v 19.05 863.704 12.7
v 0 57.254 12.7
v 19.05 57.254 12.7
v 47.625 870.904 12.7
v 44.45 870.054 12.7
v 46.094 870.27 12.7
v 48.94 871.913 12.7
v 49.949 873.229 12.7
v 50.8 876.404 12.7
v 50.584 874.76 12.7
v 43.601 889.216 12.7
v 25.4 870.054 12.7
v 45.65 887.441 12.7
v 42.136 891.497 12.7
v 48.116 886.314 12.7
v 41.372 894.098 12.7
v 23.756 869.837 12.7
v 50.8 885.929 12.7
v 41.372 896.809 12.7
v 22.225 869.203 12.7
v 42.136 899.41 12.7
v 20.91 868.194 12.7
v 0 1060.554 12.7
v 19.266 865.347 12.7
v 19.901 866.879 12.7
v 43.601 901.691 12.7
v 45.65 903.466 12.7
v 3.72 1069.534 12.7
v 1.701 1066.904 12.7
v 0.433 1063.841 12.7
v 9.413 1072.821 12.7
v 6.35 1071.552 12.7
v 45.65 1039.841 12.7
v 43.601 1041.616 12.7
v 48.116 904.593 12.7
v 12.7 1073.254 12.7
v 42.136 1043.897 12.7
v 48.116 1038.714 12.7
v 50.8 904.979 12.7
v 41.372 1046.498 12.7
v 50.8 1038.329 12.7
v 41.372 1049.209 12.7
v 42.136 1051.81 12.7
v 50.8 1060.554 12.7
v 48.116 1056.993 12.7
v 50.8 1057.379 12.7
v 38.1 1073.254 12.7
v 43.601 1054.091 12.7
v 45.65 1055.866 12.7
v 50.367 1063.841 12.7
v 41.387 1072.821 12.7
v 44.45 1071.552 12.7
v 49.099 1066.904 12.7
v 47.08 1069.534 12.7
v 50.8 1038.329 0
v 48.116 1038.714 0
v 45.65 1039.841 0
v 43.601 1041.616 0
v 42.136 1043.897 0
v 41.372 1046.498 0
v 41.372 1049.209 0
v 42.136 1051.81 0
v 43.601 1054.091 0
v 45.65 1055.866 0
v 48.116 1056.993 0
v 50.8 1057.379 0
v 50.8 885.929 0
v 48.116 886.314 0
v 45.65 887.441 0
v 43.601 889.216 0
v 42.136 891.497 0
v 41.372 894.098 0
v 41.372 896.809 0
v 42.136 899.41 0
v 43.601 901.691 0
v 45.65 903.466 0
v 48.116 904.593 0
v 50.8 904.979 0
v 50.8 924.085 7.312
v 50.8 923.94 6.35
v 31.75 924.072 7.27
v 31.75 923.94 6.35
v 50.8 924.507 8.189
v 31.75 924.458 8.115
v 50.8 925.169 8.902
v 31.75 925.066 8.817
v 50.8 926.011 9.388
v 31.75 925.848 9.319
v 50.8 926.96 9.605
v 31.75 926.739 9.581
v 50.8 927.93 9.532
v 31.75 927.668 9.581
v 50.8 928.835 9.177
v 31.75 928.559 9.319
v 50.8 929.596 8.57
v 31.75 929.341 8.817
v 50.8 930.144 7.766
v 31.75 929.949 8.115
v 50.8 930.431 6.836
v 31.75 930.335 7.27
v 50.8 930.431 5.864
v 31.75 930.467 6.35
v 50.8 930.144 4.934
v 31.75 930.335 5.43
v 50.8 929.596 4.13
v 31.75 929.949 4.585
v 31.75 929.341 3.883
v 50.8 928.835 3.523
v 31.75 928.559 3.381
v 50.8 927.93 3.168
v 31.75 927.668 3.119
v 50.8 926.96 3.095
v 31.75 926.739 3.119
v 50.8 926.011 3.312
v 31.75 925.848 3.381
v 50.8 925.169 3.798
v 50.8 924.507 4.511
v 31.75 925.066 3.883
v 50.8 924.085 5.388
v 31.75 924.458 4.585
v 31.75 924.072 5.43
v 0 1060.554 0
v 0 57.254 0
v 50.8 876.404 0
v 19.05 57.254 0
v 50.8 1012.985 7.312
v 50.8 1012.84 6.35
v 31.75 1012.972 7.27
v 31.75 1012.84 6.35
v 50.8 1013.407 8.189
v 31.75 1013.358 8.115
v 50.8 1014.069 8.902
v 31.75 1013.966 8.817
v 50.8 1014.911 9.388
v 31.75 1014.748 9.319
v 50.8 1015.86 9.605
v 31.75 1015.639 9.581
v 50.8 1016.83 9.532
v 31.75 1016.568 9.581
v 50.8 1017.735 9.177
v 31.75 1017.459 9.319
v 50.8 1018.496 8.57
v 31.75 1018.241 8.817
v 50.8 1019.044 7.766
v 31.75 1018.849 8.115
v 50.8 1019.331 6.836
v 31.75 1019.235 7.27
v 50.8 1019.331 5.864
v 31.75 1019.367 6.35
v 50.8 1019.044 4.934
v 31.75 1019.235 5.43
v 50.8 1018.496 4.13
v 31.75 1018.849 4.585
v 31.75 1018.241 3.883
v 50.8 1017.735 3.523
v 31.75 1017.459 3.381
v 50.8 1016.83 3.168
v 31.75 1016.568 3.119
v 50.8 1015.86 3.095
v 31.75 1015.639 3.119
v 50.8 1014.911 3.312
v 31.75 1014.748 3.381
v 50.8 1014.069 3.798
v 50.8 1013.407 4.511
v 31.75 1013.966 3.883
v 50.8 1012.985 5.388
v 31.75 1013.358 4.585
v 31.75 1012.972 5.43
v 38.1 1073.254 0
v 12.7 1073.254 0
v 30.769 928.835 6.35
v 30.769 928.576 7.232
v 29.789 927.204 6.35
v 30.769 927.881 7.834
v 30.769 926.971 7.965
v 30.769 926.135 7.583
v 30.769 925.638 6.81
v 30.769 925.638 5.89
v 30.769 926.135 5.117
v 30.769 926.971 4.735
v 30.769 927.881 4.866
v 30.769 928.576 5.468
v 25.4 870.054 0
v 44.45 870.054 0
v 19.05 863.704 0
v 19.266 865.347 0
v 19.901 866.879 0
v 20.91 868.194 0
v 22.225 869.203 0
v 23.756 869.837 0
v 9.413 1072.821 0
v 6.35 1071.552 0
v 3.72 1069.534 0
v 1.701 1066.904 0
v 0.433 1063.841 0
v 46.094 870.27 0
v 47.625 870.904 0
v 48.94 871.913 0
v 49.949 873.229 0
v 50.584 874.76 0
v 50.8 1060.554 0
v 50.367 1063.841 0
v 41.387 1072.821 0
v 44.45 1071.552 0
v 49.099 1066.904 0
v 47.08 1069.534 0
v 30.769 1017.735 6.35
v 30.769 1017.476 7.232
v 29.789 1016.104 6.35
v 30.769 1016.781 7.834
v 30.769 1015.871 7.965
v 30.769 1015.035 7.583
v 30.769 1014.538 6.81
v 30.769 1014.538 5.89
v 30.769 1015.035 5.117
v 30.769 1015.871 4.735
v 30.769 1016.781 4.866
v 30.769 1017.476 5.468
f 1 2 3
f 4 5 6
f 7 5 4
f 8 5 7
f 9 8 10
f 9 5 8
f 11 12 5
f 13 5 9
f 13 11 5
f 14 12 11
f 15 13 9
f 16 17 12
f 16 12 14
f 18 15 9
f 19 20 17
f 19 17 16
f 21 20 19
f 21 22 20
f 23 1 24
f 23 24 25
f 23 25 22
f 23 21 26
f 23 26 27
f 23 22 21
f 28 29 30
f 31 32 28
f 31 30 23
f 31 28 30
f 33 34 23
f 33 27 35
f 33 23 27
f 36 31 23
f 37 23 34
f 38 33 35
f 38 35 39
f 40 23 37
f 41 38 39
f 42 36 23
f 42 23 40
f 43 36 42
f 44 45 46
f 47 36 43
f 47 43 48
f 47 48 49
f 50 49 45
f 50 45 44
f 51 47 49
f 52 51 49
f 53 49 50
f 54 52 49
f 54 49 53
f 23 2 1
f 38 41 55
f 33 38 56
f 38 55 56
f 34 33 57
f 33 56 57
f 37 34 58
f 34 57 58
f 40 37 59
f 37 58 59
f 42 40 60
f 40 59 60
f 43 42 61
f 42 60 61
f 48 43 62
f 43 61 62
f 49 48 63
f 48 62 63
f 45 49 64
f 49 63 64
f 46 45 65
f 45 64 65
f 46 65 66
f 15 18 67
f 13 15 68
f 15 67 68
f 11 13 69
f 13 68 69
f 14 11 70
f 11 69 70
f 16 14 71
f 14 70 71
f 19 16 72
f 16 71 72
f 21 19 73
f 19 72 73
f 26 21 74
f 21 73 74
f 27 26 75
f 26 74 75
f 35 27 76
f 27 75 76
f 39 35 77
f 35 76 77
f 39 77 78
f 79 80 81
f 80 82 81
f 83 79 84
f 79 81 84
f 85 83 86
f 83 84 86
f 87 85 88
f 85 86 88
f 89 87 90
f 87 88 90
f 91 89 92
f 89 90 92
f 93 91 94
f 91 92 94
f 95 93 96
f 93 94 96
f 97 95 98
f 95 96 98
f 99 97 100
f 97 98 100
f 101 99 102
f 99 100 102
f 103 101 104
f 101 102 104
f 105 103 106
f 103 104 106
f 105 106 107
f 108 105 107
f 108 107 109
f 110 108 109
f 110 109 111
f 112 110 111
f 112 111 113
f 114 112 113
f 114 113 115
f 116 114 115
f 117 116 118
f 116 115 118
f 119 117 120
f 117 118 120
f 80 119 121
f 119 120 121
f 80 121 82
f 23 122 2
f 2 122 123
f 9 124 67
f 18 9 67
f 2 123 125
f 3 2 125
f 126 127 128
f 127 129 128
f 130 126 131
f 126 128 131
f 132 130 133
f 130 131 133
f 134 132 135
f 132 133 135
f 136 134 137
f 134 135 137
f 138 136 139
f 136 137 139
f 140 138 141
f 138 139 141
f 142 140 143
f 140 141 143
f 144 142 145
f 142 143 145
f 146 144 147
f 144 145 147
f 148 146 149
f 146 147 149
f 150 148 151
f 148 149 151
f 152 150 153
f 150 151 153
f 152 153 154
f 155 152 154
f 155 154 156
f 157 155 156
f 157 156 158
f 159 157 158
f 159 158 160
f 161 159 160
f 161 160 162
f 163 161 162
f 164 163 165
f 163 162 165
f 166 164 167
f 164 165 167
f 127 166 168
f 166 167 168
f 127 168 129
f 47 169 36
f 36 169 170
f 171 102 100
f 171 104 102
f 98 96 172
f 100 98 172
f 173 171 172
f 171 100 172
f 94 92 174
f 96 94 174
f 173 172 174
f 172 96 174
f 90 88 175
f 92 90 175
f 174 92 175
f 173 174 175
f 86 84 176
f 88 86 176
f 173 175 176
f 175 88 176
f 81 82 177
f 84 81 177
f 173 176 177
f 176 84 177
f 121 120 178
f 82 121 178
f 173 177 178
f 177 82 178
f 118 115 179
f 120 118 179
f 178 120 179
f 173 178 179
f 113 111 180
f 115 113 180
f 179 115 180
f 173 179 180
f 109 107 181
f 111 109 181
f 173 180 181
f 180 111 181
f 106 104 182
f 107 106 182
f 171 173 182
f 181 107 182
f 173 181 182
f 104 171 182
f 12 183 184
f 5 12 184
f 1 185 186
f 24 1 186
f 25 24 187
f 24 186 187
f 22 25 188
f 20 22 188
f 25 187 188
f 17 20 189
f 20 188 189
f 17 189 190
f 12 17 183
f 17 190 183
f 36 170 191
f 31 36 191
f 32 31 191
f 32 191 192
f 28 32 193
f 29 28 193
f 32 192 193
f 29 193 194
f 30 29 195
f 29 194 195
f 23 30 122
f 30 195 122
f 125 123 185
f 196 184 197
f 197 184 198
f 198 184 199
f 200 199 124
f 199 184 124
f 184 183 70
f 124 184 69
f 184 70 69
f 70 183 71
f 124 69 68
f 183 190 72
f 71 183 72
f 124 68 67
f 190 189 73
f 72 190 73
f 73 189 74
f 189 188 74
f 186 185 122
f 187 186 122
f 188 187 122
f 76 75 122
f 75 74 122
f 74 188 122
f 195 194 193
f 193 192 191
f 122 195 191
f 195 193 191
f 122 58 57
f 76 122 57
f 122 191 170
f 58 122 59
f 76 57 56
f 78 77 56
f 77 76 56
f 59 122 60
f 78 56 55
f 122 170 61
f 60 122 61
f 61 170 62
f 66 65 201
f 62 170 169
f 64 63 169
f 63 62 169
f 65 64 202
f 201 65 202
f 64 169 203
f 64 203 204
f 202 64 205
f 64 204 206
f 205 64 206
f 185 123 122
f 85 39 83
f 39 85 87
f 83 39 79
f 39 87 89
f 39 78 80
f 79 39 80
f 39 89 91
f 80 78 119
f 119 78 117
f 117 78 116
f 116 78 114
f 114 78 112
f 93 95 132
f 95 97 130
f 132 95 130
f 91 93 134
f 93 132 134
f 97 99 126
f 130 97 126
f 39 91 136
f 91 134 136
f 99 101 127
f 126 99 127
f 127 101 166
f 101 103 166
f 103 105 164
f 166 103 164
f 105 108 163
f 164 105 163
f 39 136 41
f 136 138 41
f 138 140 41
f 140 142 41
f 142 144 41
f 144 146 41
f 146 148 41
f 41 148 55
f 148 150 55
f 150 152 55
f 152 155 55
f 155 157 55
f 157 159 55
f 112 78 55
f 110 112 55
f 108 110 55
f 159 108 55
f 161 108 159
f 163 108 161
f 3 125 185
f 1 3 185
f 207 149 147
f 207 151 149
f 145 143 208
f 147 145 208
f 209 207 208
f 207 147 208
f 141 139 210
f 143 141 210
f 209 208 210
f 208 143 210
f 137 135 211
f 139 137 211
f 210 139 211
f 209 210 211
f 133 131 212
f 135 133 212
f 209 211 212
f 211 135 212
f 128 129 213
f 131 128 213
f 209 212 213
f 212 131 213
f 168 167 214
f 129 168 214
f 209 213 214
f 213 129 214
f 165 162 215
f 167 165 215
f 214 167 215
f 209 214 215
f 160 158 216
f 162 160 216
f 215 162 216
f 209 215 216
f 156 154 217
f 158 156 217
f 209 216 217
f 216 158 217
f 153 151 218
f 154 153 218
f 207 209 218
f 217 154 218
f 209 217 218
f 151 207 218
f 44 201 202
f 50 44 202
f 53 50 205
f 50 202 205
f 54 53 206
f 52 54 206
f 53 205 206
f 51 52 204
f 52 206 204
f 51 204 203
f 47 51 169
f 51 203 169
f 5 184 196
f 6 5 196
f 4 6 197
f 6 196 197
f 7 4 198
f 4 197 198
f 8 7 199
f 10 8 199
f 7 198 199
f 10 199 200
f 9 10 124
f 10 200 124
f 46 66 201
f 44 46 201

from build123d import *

# Parameters (mm, degrees)
F1_DEPTH = 12.7
F3_D     = 19.05
F5_D     = 6.5278
F5_DEPTH = 19.05
F5_TIP   = 1.9611489744


# Not quite as in the source:
# - a feature names something its author has since deleted; it is built from what else it names


with BuildPart() as f1:
    # F0 (on Top) → F1 (new body)
    with BuildSketch(Plane.XY):
        with BuildLine():
            Line((38.1, 1073.25354091), (12.7, 1073.25354091))
            ThreePointArc((12.7, 1073.25354091), (3.7197438789, 1069.5337970311), (0, 1060.55354091))
            Line((0, 1060.55354091), (0, 57.25354091))
            Line((0, 57.25354091), (19.05, 57.25354091))
            Line((19.05, 57.25354091), (19.05, 863.70354091))
            ThreePointArc((19.05, 863.70354091), (20.9098719395, 868.1936689706), (25.4, 870.05354091))
            Line((25.4, 870.05354091), (44.45, 870.05354091))
            ThreePointArc((44.45, 870.05354091), (48.9401280605, 871.9134128495), (50.8, 876.40354091))
            Line((50.8, 876.40354091), (50.8, 1060.55354091))
            ThreePointArc((50.8, 1060.55354091), (47.0802561211, 1069.5337970311), (38.1, 1073.25354091))
        make_face()
    extrude(amount=F1_DEPTH)

    # F3 (through all)
    with Locations(Plane.XY.offset(12.7)):
        with Locations((50.8, 1047.85354091), (50.8, 895.45354091)):
            Hole(F3_D / 2)

    # F5
    with Locations(Plane.YZ.offset(50.8)):
        with Locations((1016.10354091, 6.35), (927.20354091, 6.35)):
            Hole(F5_D / 2, depth=F5_DEPTH)
            with Locations((0, 0, -(F5_DEPTH + F5_TIP / 2))):  # 118° drill point
                Cone(0, F5_D / 2, F5_TIP, mode=Mode.SUBTRACT)


solid = f1.part
